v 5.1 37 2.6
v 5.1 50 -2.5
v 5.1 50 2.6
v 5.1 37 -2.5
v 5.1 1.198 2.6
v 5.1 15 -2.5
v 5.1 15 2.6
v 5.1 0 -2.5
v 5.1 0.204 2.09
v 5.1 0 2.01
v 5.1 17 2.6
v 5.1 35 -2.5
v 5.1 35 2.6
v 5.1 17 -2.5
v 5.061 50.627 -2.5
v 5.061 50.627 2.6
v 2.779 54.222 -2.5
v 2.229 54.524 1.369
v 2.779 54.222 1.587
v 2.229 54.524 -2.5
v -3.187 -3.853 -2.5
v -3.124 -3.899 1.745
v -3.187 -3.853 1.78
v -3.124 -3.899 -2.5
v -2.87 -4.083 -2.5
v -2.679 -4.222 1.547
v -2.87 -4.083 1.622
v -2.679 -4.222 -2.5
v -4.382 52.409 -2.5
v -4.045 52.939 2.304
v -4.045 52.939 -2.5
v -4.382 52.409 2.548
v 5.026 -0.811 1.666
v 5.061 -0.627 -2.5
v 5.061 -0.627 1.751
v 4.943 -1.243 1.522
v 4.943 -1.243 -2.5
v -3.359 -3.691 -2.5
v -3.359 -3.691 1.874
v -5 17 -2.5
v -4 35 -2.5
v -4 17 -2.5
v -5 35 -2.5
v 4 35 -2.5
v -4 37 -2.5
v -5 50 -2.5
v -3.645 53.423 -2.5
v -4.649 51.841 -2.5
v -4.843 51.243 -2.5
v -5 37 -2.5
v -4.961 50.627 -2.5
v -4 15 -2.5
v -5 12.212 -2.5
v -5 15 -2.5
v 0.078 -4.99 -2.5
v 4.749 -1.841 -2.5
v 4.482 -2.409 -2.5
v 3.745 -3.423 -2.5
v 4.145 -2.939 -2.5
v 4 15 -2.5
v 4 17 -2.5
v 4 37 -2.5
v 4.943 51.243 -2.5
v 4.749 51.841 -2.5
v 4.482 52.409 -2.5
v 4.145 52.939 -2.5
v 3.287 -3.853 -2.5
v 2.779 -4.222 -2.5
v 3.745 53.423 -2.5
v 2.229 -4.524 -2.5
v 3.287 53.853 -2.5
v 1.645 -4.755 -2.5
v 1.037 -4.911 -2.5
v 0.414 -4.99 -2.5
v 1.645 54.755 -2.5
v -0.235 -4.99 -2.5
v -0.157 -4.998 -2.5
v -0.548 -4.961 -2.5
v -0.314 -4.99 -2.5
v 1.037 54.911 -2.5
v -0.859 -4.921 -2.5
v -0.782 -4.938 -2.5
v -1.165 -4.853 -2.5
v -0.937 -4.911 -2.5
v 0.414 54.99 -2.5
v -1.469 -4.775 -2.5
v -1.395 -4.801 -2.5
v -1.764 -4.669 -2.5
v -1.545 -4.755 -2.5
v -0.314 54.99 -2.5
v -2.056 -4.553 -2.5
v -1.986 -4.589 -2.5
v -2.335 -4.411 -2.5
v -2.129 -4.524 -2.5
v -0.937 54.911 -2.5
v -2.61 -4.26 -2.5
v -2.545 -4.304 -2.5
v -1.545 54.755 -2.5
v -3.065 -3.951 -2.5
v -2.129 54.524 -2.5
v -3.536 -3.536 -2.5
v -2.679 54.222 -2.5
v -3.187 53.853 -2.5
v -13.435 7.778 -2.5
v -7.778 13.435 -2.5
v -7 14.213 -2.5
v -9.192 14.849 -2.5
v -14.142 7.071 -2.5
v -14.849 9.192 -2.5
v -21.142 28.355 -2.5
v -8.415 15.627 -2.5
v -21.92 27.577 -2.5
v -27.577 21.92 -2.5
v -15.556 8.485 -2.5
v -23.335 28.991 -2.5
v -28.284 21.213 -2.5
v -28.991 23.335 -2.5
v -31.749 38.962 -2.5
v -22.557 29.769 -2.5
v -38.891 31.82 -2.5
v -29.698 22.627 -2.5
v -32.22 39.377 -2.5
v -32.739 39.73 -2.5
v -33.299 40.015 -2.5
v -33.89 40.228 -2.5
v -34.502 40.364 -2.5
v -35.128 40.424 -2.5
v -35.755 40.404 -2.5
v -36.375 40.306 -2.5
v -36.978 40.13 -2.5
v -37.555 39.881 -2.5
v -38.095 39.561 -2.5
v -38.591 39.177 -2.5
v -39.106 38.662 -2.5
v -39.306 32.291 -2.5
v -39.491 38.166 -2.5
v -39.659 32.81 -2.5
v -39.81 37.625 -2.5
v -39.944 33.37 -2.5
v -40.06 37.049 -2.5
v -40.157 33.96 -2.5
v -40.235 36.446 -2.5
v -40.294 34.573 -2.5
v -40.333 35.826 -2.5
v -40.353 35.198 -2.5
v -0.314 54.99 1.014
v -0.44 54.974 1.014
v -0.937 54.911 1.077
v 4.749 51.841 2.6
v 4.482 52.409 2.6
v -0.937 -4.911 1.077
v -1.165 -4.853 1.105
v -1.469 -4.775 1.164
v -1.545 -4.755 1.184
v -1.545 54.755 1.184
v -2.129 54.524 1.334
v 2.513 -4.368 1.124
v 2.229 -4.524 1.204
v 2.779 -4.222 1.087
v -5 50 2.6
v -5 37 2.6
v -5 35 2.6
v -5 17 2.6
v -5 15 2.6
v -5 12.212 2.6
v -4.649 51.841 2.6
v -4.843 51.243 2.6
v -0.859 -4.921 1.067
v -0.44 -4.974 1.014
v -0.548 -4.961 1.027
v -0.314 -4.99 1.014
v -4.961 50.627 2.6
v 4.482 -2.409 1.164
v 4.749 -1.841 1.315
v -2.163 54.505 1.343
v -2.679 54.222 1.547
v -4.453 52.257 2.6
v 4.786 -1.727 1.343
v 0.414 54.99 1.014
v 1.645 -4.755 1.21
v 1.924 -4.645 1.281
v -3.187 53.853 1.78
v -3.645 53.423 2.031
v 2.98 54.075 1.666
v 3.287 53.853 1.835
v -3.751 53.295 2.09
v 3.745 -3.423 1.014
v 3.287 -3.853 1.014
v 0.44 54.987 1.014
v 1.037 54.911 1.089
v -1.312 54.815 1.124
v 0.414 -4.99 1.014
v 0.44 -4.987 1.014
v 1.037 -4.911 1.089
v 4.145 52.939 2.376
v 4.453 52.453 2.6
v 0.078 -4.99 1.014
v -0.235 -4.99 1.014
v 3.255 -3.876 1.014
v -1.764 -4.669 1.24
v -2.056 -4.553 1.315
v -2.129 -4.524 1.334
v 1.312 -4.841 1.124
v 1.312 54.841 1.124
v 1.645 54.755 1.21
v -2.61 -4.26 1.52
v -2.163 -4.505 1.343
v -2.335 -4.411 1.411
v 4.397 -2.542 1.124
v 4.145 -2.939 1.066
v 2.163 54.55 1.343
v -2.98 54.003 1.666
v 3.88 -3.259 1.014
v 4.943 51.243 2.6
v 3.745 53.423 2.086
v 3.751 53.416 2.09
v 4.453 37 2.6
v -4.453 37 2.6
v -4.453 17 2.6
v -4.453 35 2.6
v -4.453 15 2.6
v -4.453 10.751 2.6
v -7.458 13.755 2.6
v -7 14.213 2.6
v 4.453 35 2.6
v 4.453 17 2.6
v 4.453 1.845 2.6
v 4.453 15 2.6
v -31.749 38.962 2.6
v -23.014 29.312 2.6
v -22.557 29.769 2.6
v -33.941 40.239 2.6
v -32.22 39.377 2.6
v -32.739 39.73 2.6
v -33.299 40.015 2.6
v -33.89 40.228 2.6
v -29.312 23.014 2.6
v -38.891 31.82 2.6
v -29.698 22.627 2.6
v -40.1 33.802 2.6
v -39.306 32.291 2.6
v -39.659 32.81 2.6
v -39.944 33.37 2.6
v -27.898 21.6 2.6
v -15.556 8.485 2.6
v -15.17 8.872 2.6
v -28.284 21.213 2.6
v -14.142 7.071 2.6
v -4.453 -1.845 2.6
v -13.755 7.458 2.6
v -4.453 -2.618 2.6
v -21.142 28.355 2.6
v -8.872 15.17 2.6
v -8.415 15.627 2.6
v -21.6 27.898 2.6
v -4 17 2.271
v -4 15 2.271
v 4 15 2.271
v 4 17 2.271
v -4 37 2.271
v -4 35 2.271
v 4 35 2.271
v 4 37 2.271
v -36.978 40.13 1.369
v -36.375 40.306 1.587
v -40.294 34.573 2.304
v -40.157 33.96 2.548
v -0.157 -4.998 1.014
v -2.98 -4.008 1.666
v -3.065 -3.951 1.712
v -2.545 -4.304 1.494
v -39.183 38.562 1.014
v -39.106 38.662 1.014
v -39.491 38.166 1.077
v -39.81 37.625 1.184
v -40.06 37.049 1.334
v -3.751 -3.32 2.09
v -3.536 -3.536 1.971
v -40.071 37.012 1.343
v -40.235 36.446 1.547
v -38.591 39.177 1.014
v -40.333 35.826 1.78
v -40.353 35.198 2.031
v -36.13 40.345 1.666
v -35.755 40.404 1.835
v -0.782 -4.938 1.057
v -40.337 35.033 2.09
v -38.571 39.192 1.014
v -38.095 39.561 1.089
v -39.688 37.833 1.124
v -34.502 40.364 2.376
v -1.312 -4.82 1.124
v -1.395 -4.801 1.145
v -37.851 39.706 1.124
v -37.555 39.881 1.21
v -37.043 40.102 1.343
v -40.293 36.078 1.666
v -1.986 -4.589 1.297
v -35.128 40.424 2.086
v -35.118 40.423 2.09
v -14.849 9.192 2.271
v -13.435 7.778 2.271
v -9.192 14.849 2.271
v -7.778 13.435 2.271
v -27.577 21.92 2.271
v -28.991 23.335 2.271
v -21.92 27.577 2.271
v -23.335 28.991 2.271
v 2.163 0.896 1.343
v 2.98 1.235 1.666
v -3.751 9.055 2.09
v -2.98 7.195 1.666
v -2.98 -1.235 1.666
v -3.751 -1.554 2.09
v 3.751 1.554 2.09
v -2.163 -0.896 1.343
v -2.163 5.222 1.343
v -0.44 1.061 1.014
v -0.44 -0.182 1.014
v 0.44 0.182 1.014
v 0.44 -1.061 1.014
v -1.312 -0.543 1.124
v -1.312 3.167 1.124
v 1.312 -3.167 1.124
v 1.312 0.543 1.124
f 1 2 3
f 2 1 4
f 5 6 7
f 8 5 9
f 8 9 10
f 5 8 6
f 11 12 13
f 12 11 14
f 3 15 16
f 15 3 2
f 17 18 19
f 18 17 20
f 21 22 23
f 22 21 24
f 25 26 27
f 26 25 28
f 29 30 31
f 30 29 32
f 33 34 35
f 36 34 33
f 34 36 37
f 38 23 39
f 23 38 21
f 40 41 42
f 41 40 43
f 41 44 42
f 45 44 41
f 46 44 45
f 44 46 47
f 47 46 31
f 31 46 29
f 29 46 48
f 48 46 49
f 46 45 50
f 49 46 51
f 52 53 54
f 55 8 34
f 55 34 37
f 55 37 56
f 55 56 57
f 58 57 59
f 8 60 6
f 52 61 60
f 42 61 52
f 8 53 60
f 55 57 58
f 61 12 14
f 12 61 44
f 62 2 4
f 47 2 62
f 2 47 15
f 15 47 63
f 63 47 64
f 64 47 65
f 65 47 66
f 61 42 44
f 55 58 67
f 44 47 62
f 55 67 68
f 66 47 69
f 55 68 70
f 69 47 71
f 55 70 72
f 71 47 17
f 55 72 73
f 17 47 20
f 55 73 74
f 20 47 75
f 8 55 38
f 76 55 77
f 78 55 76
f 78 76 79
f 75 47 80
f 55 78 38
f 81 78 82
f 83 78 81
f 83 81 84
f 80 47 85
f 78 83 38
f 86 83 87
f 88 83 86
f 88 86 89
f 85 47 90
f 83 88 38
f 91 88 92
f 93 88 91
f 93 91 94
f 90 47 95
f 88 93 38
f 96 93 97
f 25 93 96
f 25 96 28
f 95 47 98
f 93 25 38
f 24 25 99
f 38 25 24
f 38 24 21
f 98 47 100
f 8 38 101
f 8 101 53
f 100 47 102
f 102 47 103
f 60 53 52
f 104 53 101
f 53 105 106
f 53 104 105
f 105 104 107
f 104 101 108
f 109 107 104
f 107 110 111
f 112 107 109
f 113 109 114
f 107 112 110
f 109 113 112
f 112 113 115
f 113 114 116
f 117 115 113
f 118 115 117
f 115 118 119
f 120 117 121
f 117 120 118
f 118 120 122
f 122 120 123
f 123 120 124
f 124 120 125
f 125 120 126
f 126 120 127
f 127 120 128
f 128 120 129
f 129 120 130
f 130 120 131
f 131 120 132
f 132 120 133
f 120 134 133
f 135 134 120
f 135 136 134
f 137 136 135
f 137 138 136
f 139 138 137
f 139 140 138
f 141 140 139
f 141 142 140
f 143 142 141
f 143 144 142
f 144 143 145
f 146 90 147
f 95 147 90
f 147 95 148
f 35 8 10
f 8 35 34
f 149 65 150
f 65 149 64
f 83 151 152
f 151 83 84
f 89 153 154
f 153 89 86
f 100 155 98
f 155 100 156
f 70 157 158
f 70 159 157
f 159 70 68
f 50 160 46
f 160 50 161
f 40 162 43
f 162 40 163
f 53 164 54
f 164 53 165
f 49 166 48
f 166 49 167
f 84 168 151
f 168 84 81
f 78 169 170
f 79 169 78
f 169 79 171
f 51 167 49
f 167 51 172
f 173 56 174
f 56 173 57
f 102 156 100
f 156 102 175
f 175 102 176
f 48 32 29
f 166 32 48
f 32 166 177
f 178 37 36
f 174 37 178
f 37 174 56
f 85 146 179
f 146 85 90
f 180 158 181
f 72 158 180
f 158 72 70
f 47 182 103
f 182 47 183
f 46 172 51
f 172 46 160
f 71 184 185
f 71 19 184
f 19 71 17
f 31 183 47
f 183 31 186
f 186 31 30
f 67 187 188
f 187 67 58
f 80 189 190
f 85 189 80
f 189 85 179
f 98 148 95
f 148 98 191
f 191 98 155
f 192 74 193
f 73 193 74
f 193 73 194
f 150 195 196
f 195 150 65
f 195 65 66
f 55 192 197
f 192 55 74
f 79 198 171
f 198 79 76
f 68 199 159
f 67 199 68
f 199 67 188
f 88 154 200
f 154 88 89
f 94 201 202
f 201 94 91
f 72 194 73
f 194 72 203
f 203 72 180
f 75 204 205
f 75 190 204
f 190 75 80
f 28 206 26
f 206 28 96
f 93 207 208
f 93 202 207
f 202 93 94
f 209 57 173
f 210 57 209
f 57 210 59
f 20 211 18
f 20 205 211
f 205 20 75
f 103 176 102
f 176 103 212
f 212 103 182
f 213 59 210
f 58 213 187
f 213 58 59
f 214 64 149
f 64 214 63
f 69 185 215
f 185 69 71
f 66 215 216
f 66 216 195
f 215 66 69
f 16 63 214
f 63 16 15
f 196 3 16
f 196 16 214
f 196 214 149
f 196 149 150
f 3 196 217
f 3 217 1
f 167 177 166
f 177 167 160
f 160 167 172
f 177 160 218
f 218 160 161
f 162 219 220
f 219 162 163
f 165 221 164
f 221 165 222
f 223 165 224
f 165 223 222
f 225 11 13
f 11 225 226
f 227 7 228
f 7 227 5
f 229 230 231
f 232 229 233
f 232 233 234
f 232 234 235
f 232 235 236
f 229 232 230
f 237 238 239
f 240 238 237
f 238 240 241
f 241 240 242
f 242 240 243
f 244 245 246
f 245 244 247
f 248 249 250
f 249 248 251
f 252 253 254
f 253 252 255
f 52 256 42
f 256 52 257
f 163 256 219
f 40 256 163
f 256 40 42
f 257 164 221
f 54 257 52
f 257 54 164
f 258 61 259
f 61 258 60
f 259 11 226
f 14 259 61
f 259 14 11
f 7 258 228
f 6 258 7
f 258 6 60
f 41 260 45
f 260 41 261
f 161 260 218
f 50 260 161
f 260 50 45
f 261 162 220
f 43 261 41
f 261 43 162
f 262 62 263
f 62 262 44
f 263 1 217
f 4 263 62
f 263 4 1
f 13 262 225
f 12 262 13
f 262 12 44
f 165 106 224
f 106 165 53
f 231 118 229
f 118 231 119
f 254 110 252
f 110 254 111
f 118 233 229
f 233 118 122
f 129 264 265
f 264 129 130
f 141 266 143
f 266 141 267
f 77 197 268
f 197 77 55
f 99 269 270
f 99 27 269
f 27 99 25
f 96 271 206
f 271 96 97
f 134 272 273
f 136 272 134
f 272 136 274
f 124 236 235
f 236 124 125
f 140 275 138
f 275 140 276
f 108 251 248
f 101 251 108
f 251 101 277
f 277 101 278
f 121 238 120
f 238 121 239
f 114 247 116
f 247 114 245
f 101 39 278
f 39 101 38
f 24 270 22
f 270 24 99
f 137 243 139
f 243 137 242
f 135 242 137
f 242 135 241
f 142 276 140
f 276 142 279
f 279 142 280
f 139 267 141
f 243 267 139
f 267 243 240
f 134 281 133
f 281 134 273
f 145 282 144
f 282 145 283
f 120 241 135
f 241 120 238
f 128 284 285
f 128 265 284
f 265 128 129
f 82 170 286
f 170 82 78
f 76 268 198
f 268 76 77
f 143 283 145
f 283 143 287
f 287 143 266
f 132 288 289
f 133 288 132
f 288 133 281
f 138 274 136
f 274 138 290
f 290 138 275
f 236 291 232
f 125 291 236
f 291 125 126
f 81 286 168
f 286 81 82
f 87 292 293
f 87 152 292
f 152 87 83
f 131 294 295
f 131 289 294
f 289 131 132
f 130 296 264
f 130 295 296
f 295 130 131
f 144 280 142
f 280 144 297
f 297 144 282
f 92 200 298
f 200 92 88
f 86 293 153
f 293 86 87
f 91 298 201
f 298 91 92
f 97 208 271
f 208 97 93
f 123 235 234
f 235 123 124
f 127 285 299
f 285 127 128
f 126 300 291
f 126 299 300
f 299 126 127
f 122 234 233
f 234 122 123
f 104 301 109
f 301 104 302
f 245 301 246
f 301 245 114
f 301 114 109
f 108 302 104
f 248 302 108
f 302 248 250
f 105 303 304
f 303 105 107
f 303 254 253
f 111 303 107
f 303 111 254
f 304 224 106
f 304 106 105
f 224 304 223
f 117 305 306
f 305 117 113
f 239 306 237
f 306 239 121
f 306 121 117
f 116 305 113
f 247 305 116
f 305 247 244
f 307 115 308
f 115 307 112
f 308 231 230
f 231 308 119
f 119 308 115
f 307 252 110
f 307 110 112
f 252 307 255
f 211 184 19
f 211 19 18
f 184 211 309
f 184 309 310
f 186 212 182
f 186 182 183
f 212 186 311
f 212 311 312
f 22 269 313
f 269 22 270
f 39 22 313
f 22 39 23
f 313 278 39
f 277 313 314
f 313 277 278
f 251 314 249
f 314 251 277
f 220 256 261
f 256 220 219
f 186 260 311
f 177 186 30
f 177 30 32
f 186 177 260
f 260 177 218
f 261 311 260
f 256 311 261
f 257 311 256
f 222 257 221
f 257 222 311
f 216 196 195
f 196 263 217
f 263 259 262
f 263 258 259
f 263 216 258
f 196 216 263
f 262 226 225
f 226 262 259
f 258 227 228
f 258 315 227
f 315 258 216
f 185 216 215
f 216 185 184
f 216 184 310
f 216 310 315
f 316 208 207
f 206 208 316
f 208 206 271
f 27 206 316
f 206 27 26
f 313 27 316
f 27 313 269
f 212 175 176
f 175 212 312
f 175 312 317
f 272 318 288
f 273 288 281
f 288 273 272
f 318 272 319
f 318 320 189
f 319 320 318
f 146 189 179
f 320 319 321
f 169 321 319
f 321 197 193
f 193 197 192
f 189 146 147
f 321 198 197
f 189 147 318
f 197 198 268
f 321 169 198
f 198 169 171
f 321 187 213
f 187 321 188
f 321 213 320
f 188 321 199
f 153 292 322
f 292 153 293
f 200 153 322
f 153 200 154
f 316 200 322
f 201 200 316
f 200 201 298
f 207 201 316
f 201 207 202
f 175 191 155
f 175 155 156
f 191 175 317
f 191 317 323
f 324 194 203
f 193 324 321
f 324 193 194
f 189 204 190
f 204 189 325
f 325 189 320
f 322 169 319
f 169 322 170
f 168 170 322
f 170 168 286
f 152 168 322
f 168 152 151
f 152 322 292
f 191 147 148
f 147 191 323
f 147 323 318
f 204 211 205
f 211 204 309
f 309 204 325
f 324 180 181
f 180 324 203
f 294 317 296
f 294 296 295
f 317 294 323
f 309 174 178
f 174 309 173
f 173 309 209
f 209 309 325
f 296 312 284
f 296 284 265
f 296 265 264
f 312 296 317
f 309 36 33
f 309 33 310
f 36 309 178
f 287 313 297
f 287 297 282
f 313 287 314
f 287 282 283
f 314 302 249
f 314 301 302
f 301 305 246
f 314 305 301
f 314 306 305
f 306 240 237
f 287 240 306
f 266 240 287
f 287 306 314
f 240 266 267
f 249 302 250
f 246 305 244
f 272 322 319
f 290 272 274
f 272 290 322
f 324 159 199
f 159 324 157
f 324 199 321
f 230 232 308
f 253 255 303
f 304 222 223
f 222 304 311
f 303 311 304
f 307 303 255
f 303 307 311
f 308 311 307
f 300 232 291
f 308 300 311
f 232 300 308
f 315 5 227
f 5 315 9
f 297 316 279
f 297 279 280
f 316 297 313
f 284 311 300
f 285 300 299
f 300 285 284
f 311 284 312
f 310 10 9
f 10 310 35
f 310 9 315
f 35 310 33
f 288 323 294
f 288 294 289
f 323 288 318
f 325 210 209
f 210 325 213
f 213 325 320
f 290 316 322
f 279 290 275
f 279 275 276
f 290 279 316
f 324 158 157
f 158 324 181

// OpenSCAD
$fn=50;

module a() {

  translate([-10, -10, -10])
      cube([20, 70 , 20 ]);

}




module a1() {
  a();

  rotate([0, 90, 90])
    a();

  rotate([90, 0, -90])
    a();
}

//module b() {
//
//  translate([-5, -5, -5])
//  difference() {
//    cube([10, 50 , 10 ]);
//  }
//
//}

module c() {

  translate([0, 0, 0])
  rotate([-90, 0, 0])
  cylinder(80, 7, 7);
}

module d() {
    rotate([90, 0, -90])
    c();

    rotate([0, 0, 0])
    c();
    
    rotate([0, 0, 90])
    c();
}



module f() {
  
translate([10, -10, -10])
rotate([0, 0, -45])
rotate([0, -55, 0])
cylinder(100, 2.2, 2.2);
  
}

module e() {
  
  difference() {
    
    translate([-60, 10, 10])
      cube([50, 50, 50]);
    
    translate([-30, 30, 30])
    rotate([0, 45 , 0])
    rotate([0, 0 , 90+55])
      translate([0, -100, -100])
        rotate([0, 0, 0])
          cube([200, 200, 200]);


    translate([-10, 10, 10])
    d();
    
    f();

  }
  
}



module g() {
  translate([0, 0, 0]) {

    difference() {
        a1();

      translate([-10, 10, 10])
      d();
      
      f();
    }
  }
}

module mount(mode = 1) {
  if (mode == 1) {
    difference() {
      minkowski() {
        cube([0.1, 50, 0.1]);

        cylinder(5, 5, 5, center=true);
      }
      
    translate([-8, 15, -5])
      cube([4, 2, 10]);
    
    translate([4, 15, -5])
      cube([4, 2, 10]);

    translate([-8, 35, -5])
      cube([4, 2, 10]);
    
    translate([4, 35, -5])
      cube([4, 2, 10]);

    }
  } else if (mode == 2) {
      translate([0, -15, 8])
        c();    
  }
}

module mount90() {
}

//rotate([-90-55, 0, 0])
//rotate([0, 45, 0])
//e();

//g();


difference() {
  union() {
    mount();
    rotate([0, 0, 45])
    mount();
  }
  
  mount(mode = 2);
  rotate([0, 0, 45])
  mount(mode = 2);  
}



//difference() {
//  union() {
//    mount();
//    rotate([0, 0, 45])
//      mount();
//    rotate([0, 0, 90])
//      mount();
//  }
//  
//  mount(mode = 2);
//  rotate([0, 0, 45])
//    mount(mode = 2);  
//  rotate([0, 0, 90])
//    mount(mode = 2);  
//}

//difference() {
//  union() {
//    mount();
//    rotate([0, 0, 90])
//      mount();
//  }
//  
//  mount(mode = 2);
//  rotate([0, 0, 90])
//    mount(mode = 2);  
//}
